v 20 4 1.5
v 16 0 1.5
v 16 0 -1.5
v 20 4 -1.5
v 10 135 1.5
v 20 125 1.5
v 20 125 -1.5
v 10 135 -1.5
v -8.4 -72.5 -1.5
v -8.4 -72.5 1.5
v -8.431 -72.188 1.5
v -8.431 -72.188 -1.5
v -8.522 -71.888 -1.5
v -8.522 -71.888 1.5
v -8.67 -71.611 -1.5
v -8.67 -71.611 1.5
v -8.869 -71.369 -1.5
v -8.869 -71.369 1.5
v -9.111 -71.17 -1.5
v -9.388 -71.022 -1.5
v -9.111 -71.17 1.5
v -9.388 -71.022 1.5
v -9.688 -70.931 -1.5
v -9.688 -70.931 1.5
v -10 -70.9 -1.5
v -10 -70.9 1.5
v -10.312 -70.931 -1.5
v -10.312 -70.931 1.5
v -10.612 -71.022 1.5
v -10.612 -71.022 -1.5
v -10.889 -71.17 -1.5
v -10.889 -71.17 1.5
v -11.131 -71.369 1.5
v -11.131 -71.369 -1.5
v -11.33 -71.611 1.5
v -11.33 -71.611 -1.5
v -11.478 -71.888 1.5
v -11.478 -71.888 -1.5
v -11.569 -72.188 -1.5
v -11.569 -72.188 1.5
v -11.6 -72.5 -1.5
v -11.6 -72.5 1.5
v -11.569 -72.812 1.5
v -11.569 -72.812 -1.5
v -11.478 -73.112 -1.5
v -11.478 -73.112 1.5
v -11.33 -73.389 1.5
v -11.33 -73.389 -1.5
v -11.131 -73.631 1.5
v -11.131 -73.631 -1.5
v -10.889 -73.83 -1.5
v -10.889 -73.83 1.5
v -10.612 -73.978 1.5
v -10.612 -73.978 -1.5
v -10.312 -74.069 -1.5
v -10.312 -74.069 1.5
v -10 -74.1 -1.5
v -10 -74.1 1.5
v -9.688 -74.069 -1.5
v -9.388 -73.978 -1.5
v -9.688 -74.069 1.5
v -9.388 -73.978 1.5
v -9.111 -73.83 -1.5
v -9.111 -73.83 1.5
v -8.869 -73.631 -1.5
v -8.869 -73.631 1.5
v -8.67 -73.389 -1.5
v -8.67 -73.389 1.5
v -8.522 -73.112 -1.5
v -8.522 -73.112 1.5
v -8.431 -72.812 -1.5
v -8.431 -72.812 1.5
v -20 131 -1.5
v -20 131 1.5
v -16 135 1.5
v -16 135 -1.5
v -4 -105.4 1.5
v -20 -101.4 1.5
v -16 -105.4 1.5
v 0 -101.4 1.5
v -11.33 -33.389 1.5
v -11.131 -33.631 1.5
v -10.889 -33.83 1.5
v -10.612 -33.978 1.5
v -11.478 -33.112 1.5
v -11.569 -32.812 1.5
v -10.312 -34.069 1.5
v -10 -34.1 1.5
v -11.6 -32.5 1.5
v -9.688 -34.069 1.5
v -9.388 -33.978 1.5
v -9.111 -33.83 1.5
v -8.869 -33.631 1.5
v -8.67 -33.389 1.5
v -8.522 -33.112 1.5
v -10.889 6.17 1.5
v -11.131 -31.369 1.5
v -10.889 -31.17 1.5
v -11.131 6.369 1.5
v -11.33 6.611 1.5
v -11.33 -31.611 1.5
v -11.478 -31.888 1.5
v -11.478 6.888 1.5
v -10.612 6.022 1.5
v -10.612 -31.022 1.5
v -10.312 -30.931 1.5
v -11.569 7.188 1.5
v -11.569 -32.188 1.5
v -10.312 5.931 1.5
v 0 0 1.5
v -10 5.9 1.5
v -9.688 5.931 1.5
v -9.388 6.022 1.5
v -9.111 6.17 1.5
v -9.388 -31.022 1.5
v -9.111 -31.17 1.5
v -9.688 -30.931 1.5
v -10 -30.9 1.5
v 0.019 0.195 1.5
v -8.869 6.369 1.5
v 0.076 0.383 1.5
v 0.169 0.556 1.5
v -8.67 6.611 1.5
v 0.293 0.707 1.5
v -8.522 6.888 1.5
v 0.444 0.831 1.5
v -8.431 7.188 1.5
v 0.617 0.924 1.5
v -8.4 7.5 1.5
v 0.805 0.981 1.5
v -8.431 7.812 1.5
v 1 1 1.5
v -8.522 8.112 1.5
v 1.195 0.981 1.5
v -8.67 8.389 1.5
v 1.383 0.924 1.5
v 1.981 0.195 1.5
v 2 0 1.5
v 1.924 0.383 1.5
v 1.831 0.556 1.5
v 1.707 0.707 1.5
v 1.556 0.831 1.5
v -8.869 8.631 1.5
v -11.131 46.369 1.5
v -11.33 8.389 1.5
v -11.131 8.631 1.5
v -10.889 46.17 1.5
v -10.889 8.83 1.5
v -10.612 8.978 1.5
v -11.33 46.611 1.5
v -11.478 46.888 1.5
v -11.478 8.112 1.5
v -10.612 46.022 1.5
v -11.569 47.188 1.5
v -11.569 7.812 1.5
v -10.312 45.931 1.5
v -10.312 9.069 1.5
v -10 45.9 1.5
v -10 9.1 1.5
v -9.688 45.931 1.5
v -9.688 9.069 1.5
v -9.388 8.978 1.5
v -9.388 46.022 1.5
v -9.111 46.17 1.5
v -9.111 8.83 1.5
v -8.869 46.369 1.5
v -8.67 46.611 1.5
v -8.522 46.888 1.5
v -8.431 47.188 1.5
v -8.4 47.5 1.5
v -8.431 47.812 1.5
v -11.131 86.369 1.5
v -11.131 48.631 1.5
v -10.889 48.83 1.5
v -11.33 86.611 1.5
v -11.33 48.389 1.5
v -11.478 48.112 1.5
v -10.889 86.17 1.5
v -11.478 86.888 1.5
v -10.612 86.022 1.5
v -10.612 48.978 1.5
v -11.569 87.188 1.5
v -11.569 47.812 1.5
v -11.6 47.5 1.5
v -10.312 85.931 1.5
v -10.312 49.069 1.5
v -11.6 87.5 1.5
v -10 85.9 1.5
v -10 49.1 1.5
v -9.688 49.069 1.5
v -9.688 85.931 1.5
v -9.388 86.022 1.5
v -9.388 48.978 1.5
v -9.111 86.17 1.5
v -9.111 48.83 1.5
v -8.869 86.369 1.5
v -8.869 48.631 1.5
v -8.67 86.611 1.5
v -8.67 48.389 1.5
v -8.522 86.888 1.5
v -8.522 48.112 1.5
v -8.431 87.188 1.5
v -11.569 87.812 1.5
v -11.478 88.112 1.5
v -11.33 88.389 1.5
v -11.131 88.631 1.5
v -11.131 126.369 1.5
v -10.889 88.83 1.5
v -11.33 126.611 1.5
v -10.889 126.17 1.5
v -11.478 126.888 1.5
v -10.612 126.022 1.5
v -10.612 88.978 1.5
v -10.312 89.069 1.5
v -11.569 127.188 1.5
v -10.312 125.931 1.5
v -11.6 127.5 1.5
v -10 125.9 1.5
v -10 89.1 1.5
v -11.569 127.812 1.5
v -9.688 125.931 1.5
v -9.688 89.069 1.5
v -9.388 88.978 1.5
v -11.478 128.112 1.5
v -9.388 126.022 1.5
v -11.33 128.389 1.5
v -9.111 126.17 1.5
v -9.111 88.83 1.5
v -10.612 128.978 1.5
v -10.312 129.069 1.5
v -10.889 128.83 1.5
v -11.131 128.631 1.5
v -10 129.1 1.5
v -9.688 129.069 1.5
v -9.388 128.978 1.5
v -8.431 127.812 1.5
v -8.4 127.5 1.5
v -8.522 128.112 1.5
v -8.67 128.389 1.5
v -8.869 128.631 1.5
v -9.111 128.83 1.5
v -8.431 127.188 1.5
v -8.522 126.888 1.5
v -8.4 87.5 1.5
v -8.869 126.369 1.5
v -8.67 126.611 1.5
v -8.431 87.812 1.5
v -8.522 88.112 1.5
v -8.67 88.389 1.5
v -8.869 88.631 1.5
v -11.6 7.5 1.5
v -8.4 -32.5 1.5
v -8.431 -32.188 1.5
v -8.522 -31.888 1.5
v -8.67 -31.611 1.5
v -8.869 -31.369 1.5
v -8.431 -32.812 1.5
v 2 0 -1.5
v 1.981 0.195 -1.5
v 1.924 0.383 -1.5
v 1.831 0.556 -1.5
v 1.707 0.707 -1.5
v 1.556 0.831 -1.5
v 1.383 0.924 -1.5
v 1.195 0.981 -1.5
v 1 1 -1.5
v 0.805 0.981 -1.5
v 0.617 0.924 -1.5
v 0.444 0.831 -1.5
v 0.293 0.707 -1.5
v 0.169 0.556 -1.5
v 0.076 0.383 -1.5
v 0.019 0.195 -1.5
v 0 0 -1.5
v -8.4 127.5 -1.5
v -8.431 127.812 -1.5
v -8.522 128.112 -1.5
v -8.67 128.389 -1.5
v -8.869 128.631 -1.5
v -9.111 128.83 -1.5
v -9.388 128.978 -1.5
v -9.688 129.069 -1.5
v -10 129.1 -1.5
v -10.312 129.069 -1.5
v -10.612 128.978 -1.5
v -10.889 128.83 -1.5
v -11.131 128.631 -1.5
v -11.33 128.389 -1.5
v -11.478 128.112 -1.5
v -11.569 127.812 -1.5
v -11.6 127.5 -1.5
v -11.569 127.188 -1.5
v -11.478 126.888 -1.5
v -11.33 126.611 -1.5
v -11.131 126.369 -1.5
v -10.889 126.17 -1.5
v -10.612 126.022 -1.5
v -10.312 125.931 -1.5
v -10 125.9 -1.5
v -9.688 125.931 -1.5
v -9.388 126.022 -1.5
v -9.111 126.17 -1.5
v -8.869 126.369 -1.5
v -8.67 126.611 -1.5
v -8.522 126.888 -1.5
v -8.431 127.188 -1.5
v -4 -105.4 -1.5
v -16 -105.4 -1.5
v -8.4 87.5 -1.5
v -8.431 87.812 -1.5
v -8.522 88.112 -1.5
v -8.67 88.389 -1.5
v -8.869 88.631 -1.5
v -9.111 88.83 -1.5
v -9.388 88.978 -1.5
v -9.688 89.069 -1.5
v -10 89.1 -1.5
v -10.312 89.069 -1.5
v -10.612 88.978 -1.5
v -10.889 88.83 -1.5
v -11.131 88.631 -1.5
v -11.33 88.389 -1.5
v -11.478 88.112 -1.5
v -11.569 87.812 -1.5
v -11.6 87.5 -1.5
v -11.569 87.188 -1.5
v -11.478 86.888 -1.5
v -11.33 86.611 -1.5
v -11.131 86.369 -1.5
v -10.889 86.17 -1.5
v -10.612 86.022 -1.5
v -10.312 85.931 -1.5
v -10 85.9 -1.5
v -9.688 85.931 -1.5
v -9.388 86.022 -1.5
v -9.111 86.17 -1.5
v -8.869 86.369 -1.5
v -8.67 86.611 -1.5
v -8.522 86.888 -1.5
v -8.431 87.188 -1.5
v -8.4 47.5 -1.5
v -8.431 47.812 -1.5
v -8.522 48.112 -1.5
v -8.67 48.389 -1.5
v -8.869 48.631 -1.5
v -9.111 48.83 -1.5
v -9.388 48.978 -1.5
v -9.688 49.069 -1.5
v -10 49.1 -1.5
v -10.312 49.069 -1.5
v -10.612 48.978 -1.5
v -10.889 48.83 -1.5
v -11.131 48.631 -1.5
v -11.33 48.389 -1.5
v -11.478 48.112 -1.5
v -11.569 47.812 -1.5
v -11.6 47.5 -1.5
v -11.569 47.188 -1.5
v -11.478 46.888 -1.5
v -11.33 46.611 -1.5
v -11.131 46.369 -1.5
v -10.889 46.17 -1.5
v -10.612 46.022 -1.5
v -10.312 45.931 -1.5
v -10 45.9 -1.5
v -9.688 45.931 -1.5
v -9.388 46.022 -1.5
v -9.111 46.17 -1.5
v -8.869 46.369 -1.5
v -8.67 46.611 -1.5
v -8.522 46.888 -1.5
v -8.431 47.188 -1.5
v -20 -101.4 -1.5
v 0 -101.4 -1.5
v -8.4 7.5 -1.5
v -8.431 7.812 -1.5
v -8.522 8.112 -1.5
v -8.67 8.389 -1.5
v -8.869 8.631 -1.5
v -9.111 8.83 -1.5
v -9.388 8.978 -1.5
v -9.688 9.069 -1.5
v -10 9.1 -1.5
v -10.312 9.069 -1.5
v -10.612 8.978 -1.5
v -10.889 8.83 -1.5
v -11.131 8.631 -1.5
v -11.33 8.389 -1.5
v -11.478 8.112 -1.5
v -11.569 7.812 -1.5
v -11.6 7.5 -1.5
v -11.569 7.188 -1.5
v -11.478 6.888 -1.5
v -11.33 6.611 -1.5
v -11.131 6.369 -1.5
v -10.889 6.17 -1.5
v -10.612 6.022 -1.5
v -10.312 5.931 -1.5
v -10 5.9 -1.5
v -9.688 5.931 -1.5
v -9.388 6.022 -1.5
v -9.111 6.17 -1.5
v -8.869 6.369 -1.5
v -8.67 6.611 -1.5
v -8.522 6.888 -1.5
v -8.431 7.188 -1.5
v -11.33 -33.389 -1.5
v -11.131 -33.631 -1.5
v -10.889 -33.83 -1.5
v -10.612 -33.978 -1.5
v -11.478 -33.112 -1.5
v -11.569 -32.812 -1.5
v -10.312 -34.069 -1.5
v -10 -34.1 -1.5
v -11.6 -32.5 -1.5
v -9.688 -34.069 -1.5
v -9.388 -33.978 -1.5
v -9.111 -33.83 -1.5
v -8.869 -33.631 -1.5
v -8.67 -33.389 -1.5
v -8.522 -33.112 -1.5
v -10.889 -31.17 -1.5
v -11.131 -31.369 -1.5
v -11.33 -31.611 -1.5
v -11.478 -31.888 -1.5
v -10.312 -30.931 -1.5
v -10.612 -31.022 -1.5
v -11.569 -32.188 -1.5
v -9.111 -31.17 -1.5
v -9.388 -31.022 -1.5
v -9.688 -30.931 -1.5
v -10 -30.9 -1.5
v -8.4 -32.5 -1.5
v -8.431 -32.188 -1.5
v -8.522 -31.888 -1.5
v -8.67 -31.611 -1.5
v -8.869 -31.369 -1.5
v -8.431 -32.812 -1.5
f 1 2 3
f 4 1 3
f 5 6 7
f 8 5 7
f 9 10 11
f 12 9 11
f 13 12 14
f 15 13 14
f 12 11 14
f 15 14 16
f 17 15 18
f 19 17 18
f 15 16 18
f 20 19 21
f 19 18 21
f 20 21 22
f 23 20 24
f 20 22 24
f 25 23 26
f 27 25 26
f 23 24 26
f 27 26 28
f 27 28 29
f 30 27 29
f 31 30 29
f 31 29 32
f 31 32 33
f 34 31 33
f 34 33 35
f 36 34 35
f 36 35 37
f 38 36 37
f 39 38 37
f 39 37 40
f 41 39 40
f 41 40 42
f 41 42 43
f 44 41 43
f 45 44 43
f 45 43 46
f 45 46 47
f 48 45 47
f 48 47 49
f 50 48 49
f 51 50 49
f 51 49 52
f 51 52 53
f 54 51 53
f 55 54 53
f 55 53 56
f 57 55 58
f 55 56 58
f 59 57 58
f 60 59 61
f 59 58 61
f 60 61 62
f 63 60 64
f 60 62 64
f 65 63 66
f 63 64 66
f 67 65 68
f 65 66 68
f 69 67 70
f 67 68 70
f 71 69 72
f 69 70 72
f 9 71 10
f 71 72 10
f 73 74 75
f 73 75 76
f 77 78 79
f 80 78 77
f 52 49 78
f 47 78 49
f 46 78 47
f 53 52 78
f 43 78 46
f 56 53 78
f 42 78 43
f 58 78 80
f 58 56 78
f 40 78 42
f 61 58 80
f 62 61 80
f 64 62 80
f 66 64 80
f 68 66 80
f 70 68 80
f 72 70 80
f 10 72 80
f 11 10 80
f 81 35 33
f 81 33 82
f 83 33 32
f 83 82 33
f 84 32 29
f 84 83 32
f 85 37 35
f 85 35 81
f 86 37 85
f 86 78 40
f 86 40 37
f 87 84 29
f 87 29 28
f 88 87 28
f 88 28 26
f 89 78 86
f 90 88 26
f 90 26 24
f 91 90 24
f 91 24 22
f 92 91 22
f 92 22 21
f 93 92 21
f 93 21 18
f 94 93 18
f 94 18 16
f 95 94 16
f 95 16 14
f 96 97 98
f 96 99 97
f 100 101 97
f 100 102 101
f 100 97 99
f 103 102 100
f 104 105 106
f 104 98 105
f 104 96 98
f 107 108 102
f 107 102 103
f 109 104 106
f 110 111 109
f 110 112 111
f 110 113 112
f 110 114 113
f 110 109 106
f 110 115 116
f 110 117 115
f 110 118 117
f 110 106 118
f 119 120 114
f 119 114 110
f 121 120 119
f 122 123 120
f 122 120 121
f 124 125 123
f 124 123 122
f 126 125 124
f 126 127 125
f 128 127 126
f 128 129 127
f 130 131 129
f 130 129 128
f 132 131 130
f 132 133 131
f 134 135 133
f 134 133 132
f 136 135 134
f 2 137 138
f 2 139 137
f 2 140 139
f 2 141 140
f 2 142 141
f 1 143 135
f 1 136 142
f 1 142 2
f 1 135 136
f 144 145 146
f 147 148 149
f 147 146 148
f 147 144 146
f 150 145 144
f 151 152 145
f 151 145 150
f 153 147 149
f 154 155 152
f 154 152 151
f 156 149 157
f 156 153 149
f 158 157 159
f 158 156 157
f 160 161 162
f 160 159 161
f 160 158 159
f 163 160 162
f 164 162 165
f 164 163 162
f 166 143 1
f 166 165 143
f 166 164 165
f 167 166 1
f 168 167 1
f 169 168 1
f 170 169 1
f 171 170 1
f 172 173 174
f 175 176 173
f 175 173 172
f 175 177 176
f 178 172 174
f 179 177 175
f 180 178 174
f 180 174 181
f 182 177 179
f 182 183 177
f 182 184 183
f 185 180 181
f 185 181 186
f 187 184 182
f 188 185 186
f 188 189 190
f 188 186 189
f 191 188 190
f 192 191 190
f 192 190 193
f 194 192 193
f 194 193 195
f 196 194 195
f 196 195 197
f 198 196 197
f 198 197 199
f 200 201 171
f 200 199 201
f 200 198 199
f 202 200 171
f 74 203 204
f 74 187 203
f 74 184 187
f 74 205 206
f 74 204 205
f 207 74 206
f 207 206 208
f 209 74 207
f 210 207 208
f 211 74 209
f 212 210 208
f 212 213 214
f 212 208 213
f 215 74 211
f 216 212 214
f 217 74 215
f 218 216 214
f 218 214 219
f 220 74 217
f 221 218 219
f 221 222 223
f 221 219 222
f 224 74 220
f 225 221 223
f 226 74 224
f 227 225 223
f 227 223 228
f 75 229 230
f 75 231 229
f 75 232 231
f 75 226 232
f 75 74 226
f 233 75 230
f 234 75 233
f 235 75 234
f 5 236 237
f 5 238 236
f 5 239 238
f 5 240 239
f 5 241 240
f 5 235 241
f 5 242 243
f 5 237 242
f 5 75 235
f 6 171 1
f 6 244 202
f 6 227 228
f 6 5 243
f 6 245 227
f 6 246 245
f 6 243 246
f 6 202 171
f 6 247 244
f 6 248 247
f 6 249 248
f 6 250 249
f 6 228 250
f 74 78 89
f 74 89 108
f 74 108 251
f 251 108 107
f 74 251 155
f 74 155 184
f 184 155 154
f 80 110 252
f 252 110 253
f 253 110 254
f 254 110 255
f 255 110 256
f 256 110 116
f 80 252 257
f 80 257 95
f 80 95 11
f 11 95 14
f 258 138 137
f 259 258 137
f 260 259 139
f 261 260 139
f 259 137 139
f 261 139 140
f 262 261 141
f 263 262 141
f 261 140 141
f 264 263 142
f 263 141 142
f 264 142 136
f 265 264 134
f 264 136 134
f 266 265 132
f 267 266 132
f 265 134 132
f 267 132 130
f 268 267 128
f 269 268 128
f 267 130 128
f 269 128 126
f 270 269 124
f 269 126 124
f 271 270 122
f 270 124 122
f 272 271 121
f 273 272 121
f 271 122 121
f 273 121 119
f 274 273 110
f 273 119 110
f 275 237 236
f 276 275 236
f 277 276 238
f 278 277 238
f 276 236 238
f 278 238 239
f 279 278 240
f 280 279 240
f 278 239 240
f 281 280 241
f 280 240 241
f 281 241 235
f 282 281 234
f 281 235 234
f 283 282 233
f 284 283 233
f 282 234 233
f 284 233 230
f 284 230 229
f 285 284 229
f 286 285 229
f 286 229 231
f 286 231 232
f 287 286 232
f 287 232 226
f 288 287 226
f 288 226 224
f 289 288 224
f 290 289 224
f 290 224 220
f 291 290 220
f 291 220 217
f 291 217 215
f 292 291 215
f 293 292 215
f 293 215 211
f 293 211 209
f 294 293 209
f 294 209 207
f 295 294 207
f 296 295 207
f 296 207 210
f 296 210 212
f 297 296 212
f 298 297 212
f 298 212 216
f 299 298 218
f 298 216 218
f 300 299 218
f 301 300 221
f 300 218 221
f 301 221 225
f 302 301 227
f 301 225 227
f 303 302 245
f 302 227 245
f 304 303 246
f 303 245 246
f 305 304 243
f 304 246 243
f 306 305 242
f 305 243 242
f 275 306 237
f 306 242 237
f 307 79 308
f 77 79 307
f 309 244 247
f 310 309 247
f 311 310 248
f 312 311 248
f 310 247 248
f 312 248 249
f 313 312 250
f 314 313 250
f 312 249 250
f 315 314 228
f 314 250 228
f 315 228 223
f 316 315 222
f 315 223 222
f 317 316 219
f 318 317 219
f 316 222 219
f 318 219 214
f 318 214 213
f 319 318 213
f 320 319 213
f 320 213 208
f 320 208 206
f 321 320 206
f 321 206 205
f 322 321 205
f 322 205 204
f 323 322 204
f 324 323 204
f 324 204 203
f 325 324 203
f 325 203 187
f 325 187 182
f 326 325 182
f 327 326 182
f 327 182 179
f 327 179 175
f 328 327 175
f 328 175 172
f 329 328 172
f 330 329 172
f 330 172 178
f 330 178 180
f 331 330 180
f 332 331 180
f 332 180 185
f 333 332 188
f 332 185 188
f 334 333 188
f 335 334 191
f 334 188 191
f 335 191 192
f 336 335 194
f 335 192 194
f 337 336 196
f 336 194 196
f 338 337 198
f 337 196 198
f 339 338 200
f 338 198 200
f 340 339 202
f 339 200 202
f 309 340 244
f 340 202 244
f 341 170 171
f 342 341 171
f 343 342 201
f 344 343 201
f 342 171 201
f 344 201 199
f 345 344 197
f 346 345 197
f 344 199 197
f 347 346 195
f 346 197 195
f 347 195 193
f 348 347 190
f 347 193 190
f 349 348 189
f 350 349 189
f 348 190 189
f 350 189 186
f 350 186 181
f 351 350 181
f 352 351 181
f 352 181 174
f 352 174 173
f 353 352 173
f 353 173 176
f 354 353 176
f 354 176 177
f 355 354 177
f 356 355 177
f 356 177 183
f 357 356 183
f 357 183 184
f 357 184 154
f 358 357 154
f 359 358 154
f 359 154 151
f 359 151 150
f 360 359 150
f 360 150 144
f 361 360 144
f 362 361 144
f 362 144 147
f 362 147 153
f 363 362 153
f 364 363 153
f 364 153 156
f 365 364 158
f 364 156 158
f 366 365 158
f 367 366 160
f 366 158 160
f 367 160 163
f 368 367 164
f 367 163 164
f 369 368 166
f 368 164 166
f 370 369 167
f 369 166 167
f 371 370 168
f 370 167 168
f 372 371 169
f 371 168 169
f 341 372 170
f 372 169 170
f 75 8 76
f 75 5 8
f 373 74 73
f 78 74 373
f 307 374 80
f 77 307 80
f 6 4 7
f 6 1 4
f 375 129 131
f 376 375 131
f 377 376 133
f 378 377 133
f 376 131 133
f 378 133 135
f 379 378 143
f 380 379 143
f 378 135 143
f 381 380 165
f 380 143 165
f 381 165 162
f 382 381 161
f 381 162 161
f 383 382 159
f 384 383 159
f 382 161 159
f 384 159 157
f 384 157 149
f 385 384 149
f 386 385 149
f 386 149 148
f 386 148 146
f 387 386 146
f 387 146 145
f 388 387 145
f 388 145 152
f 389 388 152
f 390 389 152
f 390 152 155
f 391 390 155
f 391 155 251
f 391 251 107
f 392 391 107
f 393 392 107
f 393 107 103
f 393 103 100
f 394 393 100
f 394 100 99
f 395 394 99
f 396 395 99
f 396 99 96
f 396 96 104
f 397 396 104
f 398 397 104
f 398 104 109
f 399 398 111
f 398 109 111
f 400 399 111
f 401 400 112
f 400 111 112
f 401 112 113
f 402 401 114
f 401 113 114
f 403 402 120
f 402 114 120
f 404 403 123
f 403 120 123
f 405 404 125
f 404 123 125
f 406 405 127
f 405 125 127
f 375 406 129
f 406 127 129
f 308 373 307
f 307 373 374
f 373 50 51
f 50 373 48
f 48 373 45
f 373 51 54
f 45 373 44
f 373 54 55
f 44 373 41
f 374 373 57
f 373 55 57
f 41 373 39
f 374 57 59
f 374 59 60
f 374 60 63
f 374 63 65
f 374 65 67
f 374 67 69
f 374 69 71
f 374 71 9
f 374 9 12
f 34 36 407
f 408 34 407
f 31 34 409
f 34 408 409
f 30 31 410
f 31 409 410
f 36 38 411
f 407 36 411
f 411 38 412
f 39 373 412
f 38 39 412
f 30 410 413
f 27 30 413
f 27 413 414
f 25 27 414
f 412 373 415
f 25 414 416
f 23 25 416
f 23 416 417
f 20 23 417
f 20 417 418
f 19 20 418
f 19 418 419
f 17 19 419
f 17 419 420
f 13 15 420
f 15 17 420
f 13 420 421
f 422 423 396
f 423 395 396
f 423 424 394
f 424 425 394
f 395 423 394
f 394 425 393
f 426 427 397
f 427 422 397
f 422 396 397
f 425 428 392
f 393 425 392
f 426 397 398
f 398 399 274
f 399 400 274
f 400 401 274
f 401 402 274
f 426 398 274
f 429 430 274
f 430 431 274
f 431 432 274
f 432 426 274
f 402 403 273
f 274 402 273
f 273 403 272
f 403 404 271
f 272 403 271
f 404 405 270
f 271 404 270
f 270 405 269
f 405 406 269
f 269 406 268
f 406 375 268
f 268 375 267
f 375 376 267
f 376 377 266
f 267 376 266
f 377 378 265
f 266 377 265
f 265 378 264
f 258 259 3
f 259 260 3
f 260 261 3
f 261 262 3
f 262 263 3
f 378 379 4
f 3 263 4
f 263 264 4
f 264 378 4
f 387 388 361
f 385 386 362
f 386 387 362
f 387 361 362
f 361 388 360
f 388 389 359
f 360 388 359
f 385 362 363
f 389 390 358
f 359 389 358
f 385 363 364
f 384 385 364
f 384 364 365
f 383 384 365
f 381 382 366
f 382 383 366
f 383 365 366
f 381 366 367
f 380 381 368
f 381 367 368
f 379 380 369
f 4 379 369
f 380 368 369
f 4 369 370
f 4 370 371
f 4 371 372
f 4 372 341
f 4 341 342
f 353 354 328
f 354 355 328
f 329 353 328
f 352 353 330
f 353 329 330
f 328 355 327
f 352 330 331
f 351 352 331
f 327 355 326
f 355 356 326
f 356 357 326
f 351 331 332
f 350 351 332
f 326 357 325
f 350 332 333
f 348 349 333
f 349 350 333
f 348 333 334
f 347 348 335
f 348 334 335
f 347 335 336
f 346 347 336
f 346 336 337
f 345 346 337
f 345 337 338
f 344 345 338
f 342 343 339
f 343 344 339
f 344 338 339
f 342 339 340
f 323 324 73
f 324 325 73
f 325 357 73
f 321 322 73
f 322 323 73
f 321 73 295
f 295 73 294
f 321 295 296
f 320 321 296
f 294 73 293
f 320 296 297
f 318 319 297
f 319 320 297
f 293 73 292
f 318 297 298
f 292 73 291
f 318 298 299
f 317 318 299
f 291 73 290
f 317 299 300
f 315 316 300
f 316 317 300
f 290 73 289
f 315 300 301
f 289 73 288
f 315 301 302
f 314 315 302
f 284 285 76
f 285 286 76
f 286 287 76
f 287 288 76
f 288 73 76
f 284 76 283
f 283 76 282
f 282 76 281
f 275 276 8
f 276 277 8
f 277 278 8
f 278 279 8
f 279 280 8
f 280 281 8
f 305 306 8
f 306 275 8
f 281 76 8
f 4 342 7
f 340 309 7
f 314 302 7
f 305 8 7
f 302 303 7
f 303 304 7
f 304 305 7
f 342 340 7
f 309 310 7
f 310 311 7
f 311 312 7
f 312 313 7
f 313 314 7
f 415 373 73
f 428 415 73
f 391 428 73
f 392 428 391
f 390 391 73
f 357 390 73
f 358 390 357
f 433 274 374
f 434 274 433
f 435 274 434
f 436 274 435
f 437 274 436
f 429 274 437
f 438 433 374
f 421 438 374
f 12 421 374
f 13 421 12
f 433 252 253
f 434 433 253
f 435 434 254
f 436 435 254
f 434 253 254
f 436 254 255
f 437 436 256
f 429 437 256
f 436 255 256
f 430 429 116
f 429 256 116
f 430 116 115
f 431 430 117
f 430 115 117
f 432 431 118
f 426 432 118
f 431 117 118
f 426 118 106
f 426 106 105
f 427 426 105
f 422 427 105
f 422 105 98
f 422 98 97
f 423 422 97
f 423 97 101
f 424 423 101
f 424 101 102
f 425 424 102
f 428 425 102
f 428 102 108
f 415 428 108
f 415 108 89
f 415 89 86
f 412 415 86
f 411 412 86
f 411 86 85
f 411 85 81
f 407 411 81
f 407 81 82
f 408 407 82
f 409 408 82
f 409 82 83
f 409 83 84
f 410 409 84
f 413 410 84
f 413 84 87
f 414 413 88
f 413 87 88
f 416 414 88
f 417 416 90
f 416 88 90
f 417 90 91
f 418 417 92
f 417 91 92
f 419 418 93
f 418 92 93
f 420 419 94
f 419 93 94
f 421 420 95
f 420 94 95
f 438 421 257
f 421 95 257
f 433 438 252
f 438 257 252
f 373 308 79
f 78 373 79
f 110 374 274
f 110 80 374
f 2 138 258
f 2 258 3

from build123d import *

# Parameters (mm, degrees)
EXTRUDE_1_DEPTH        = 1.5
SKETCH_2_R             = 1.6
CUT_EXTRUDE_1_DEPTH    = 137.506410106
PATTERN_LINEAR_1_COUNT = 6
PATTERN_LINEAR_1_PITCH = 40
CHAMFER_1_SIZE         = 10
CHAMFER_2_SIZE         = 4
SKETCH_3_R             = 1
CUT_EXTRUDE_2_DEPTH    = 137.506410106


with BuildPart() as part:
    # 草图1 → 凸台-拉伸1 (new, symmetric)
    with BuildSketch(Plane.XY):
        Polygon((-20, 135), (-20, -105.4), (0, -105.4), (0, 0), (20, 0), (20, 135), align=None)
    extrude(amount=EXTRUDE_1_DEPTH, both=True)

    # 草图2 → 切除-拉伸1 (cut, through all)
    with BuildSketch(Plane.XY.offset(1.5)):
        with Locations((-10, 127.5)):
            Circle(SKETCH_2_R)
    cut_extrude_1 = extrude(amount=-CUT_EXTRUDE_1_DEPTH, mode=Mode.SUBTRACT)

    # 阵列(线性)1: 切除-拉伸1 ×6
    with Locations(*[(0, -i * PATTERN_LINEAR_1_PITCH, 0) for i in range(1, PATTERN_LINEAR_1_COUNT)]):
        add(cut_extrude_1, mode=Mode.SUBTRACT)

    # 倒角1
    chamfer_1_edges = [part.edges().sort_by_distance(p)[0] for p in [
        (20, 135, 0),
    ]]
    chamfer(chamfer_1_edges, length=CHAMFER_1_SIZE)

    # 倒角2
    chamfer_2_edges = [part.edges().sort_by_distance(p)[0] for p in [
        (20, 0, 0),
        (0, -105.4, 0),
        (-20, -105.4, 0),
        (-20, 135, 0),
    ]]
    chamfer(chamfer_2_edges, length=CHAMFER_2_SIZE)

    # 草图3 → 切除-拉伸2 (cut, through all)
    with BuildSketch(Plane.XY.offset(1.5)):
        with Locations((1, 0)):
            Circle(SKETCH_3_R)
    extrude(amount=-CUT_EXTRUDE_2_DEPTH, mode=Mode.SUBTRACT)


solid = part.part
